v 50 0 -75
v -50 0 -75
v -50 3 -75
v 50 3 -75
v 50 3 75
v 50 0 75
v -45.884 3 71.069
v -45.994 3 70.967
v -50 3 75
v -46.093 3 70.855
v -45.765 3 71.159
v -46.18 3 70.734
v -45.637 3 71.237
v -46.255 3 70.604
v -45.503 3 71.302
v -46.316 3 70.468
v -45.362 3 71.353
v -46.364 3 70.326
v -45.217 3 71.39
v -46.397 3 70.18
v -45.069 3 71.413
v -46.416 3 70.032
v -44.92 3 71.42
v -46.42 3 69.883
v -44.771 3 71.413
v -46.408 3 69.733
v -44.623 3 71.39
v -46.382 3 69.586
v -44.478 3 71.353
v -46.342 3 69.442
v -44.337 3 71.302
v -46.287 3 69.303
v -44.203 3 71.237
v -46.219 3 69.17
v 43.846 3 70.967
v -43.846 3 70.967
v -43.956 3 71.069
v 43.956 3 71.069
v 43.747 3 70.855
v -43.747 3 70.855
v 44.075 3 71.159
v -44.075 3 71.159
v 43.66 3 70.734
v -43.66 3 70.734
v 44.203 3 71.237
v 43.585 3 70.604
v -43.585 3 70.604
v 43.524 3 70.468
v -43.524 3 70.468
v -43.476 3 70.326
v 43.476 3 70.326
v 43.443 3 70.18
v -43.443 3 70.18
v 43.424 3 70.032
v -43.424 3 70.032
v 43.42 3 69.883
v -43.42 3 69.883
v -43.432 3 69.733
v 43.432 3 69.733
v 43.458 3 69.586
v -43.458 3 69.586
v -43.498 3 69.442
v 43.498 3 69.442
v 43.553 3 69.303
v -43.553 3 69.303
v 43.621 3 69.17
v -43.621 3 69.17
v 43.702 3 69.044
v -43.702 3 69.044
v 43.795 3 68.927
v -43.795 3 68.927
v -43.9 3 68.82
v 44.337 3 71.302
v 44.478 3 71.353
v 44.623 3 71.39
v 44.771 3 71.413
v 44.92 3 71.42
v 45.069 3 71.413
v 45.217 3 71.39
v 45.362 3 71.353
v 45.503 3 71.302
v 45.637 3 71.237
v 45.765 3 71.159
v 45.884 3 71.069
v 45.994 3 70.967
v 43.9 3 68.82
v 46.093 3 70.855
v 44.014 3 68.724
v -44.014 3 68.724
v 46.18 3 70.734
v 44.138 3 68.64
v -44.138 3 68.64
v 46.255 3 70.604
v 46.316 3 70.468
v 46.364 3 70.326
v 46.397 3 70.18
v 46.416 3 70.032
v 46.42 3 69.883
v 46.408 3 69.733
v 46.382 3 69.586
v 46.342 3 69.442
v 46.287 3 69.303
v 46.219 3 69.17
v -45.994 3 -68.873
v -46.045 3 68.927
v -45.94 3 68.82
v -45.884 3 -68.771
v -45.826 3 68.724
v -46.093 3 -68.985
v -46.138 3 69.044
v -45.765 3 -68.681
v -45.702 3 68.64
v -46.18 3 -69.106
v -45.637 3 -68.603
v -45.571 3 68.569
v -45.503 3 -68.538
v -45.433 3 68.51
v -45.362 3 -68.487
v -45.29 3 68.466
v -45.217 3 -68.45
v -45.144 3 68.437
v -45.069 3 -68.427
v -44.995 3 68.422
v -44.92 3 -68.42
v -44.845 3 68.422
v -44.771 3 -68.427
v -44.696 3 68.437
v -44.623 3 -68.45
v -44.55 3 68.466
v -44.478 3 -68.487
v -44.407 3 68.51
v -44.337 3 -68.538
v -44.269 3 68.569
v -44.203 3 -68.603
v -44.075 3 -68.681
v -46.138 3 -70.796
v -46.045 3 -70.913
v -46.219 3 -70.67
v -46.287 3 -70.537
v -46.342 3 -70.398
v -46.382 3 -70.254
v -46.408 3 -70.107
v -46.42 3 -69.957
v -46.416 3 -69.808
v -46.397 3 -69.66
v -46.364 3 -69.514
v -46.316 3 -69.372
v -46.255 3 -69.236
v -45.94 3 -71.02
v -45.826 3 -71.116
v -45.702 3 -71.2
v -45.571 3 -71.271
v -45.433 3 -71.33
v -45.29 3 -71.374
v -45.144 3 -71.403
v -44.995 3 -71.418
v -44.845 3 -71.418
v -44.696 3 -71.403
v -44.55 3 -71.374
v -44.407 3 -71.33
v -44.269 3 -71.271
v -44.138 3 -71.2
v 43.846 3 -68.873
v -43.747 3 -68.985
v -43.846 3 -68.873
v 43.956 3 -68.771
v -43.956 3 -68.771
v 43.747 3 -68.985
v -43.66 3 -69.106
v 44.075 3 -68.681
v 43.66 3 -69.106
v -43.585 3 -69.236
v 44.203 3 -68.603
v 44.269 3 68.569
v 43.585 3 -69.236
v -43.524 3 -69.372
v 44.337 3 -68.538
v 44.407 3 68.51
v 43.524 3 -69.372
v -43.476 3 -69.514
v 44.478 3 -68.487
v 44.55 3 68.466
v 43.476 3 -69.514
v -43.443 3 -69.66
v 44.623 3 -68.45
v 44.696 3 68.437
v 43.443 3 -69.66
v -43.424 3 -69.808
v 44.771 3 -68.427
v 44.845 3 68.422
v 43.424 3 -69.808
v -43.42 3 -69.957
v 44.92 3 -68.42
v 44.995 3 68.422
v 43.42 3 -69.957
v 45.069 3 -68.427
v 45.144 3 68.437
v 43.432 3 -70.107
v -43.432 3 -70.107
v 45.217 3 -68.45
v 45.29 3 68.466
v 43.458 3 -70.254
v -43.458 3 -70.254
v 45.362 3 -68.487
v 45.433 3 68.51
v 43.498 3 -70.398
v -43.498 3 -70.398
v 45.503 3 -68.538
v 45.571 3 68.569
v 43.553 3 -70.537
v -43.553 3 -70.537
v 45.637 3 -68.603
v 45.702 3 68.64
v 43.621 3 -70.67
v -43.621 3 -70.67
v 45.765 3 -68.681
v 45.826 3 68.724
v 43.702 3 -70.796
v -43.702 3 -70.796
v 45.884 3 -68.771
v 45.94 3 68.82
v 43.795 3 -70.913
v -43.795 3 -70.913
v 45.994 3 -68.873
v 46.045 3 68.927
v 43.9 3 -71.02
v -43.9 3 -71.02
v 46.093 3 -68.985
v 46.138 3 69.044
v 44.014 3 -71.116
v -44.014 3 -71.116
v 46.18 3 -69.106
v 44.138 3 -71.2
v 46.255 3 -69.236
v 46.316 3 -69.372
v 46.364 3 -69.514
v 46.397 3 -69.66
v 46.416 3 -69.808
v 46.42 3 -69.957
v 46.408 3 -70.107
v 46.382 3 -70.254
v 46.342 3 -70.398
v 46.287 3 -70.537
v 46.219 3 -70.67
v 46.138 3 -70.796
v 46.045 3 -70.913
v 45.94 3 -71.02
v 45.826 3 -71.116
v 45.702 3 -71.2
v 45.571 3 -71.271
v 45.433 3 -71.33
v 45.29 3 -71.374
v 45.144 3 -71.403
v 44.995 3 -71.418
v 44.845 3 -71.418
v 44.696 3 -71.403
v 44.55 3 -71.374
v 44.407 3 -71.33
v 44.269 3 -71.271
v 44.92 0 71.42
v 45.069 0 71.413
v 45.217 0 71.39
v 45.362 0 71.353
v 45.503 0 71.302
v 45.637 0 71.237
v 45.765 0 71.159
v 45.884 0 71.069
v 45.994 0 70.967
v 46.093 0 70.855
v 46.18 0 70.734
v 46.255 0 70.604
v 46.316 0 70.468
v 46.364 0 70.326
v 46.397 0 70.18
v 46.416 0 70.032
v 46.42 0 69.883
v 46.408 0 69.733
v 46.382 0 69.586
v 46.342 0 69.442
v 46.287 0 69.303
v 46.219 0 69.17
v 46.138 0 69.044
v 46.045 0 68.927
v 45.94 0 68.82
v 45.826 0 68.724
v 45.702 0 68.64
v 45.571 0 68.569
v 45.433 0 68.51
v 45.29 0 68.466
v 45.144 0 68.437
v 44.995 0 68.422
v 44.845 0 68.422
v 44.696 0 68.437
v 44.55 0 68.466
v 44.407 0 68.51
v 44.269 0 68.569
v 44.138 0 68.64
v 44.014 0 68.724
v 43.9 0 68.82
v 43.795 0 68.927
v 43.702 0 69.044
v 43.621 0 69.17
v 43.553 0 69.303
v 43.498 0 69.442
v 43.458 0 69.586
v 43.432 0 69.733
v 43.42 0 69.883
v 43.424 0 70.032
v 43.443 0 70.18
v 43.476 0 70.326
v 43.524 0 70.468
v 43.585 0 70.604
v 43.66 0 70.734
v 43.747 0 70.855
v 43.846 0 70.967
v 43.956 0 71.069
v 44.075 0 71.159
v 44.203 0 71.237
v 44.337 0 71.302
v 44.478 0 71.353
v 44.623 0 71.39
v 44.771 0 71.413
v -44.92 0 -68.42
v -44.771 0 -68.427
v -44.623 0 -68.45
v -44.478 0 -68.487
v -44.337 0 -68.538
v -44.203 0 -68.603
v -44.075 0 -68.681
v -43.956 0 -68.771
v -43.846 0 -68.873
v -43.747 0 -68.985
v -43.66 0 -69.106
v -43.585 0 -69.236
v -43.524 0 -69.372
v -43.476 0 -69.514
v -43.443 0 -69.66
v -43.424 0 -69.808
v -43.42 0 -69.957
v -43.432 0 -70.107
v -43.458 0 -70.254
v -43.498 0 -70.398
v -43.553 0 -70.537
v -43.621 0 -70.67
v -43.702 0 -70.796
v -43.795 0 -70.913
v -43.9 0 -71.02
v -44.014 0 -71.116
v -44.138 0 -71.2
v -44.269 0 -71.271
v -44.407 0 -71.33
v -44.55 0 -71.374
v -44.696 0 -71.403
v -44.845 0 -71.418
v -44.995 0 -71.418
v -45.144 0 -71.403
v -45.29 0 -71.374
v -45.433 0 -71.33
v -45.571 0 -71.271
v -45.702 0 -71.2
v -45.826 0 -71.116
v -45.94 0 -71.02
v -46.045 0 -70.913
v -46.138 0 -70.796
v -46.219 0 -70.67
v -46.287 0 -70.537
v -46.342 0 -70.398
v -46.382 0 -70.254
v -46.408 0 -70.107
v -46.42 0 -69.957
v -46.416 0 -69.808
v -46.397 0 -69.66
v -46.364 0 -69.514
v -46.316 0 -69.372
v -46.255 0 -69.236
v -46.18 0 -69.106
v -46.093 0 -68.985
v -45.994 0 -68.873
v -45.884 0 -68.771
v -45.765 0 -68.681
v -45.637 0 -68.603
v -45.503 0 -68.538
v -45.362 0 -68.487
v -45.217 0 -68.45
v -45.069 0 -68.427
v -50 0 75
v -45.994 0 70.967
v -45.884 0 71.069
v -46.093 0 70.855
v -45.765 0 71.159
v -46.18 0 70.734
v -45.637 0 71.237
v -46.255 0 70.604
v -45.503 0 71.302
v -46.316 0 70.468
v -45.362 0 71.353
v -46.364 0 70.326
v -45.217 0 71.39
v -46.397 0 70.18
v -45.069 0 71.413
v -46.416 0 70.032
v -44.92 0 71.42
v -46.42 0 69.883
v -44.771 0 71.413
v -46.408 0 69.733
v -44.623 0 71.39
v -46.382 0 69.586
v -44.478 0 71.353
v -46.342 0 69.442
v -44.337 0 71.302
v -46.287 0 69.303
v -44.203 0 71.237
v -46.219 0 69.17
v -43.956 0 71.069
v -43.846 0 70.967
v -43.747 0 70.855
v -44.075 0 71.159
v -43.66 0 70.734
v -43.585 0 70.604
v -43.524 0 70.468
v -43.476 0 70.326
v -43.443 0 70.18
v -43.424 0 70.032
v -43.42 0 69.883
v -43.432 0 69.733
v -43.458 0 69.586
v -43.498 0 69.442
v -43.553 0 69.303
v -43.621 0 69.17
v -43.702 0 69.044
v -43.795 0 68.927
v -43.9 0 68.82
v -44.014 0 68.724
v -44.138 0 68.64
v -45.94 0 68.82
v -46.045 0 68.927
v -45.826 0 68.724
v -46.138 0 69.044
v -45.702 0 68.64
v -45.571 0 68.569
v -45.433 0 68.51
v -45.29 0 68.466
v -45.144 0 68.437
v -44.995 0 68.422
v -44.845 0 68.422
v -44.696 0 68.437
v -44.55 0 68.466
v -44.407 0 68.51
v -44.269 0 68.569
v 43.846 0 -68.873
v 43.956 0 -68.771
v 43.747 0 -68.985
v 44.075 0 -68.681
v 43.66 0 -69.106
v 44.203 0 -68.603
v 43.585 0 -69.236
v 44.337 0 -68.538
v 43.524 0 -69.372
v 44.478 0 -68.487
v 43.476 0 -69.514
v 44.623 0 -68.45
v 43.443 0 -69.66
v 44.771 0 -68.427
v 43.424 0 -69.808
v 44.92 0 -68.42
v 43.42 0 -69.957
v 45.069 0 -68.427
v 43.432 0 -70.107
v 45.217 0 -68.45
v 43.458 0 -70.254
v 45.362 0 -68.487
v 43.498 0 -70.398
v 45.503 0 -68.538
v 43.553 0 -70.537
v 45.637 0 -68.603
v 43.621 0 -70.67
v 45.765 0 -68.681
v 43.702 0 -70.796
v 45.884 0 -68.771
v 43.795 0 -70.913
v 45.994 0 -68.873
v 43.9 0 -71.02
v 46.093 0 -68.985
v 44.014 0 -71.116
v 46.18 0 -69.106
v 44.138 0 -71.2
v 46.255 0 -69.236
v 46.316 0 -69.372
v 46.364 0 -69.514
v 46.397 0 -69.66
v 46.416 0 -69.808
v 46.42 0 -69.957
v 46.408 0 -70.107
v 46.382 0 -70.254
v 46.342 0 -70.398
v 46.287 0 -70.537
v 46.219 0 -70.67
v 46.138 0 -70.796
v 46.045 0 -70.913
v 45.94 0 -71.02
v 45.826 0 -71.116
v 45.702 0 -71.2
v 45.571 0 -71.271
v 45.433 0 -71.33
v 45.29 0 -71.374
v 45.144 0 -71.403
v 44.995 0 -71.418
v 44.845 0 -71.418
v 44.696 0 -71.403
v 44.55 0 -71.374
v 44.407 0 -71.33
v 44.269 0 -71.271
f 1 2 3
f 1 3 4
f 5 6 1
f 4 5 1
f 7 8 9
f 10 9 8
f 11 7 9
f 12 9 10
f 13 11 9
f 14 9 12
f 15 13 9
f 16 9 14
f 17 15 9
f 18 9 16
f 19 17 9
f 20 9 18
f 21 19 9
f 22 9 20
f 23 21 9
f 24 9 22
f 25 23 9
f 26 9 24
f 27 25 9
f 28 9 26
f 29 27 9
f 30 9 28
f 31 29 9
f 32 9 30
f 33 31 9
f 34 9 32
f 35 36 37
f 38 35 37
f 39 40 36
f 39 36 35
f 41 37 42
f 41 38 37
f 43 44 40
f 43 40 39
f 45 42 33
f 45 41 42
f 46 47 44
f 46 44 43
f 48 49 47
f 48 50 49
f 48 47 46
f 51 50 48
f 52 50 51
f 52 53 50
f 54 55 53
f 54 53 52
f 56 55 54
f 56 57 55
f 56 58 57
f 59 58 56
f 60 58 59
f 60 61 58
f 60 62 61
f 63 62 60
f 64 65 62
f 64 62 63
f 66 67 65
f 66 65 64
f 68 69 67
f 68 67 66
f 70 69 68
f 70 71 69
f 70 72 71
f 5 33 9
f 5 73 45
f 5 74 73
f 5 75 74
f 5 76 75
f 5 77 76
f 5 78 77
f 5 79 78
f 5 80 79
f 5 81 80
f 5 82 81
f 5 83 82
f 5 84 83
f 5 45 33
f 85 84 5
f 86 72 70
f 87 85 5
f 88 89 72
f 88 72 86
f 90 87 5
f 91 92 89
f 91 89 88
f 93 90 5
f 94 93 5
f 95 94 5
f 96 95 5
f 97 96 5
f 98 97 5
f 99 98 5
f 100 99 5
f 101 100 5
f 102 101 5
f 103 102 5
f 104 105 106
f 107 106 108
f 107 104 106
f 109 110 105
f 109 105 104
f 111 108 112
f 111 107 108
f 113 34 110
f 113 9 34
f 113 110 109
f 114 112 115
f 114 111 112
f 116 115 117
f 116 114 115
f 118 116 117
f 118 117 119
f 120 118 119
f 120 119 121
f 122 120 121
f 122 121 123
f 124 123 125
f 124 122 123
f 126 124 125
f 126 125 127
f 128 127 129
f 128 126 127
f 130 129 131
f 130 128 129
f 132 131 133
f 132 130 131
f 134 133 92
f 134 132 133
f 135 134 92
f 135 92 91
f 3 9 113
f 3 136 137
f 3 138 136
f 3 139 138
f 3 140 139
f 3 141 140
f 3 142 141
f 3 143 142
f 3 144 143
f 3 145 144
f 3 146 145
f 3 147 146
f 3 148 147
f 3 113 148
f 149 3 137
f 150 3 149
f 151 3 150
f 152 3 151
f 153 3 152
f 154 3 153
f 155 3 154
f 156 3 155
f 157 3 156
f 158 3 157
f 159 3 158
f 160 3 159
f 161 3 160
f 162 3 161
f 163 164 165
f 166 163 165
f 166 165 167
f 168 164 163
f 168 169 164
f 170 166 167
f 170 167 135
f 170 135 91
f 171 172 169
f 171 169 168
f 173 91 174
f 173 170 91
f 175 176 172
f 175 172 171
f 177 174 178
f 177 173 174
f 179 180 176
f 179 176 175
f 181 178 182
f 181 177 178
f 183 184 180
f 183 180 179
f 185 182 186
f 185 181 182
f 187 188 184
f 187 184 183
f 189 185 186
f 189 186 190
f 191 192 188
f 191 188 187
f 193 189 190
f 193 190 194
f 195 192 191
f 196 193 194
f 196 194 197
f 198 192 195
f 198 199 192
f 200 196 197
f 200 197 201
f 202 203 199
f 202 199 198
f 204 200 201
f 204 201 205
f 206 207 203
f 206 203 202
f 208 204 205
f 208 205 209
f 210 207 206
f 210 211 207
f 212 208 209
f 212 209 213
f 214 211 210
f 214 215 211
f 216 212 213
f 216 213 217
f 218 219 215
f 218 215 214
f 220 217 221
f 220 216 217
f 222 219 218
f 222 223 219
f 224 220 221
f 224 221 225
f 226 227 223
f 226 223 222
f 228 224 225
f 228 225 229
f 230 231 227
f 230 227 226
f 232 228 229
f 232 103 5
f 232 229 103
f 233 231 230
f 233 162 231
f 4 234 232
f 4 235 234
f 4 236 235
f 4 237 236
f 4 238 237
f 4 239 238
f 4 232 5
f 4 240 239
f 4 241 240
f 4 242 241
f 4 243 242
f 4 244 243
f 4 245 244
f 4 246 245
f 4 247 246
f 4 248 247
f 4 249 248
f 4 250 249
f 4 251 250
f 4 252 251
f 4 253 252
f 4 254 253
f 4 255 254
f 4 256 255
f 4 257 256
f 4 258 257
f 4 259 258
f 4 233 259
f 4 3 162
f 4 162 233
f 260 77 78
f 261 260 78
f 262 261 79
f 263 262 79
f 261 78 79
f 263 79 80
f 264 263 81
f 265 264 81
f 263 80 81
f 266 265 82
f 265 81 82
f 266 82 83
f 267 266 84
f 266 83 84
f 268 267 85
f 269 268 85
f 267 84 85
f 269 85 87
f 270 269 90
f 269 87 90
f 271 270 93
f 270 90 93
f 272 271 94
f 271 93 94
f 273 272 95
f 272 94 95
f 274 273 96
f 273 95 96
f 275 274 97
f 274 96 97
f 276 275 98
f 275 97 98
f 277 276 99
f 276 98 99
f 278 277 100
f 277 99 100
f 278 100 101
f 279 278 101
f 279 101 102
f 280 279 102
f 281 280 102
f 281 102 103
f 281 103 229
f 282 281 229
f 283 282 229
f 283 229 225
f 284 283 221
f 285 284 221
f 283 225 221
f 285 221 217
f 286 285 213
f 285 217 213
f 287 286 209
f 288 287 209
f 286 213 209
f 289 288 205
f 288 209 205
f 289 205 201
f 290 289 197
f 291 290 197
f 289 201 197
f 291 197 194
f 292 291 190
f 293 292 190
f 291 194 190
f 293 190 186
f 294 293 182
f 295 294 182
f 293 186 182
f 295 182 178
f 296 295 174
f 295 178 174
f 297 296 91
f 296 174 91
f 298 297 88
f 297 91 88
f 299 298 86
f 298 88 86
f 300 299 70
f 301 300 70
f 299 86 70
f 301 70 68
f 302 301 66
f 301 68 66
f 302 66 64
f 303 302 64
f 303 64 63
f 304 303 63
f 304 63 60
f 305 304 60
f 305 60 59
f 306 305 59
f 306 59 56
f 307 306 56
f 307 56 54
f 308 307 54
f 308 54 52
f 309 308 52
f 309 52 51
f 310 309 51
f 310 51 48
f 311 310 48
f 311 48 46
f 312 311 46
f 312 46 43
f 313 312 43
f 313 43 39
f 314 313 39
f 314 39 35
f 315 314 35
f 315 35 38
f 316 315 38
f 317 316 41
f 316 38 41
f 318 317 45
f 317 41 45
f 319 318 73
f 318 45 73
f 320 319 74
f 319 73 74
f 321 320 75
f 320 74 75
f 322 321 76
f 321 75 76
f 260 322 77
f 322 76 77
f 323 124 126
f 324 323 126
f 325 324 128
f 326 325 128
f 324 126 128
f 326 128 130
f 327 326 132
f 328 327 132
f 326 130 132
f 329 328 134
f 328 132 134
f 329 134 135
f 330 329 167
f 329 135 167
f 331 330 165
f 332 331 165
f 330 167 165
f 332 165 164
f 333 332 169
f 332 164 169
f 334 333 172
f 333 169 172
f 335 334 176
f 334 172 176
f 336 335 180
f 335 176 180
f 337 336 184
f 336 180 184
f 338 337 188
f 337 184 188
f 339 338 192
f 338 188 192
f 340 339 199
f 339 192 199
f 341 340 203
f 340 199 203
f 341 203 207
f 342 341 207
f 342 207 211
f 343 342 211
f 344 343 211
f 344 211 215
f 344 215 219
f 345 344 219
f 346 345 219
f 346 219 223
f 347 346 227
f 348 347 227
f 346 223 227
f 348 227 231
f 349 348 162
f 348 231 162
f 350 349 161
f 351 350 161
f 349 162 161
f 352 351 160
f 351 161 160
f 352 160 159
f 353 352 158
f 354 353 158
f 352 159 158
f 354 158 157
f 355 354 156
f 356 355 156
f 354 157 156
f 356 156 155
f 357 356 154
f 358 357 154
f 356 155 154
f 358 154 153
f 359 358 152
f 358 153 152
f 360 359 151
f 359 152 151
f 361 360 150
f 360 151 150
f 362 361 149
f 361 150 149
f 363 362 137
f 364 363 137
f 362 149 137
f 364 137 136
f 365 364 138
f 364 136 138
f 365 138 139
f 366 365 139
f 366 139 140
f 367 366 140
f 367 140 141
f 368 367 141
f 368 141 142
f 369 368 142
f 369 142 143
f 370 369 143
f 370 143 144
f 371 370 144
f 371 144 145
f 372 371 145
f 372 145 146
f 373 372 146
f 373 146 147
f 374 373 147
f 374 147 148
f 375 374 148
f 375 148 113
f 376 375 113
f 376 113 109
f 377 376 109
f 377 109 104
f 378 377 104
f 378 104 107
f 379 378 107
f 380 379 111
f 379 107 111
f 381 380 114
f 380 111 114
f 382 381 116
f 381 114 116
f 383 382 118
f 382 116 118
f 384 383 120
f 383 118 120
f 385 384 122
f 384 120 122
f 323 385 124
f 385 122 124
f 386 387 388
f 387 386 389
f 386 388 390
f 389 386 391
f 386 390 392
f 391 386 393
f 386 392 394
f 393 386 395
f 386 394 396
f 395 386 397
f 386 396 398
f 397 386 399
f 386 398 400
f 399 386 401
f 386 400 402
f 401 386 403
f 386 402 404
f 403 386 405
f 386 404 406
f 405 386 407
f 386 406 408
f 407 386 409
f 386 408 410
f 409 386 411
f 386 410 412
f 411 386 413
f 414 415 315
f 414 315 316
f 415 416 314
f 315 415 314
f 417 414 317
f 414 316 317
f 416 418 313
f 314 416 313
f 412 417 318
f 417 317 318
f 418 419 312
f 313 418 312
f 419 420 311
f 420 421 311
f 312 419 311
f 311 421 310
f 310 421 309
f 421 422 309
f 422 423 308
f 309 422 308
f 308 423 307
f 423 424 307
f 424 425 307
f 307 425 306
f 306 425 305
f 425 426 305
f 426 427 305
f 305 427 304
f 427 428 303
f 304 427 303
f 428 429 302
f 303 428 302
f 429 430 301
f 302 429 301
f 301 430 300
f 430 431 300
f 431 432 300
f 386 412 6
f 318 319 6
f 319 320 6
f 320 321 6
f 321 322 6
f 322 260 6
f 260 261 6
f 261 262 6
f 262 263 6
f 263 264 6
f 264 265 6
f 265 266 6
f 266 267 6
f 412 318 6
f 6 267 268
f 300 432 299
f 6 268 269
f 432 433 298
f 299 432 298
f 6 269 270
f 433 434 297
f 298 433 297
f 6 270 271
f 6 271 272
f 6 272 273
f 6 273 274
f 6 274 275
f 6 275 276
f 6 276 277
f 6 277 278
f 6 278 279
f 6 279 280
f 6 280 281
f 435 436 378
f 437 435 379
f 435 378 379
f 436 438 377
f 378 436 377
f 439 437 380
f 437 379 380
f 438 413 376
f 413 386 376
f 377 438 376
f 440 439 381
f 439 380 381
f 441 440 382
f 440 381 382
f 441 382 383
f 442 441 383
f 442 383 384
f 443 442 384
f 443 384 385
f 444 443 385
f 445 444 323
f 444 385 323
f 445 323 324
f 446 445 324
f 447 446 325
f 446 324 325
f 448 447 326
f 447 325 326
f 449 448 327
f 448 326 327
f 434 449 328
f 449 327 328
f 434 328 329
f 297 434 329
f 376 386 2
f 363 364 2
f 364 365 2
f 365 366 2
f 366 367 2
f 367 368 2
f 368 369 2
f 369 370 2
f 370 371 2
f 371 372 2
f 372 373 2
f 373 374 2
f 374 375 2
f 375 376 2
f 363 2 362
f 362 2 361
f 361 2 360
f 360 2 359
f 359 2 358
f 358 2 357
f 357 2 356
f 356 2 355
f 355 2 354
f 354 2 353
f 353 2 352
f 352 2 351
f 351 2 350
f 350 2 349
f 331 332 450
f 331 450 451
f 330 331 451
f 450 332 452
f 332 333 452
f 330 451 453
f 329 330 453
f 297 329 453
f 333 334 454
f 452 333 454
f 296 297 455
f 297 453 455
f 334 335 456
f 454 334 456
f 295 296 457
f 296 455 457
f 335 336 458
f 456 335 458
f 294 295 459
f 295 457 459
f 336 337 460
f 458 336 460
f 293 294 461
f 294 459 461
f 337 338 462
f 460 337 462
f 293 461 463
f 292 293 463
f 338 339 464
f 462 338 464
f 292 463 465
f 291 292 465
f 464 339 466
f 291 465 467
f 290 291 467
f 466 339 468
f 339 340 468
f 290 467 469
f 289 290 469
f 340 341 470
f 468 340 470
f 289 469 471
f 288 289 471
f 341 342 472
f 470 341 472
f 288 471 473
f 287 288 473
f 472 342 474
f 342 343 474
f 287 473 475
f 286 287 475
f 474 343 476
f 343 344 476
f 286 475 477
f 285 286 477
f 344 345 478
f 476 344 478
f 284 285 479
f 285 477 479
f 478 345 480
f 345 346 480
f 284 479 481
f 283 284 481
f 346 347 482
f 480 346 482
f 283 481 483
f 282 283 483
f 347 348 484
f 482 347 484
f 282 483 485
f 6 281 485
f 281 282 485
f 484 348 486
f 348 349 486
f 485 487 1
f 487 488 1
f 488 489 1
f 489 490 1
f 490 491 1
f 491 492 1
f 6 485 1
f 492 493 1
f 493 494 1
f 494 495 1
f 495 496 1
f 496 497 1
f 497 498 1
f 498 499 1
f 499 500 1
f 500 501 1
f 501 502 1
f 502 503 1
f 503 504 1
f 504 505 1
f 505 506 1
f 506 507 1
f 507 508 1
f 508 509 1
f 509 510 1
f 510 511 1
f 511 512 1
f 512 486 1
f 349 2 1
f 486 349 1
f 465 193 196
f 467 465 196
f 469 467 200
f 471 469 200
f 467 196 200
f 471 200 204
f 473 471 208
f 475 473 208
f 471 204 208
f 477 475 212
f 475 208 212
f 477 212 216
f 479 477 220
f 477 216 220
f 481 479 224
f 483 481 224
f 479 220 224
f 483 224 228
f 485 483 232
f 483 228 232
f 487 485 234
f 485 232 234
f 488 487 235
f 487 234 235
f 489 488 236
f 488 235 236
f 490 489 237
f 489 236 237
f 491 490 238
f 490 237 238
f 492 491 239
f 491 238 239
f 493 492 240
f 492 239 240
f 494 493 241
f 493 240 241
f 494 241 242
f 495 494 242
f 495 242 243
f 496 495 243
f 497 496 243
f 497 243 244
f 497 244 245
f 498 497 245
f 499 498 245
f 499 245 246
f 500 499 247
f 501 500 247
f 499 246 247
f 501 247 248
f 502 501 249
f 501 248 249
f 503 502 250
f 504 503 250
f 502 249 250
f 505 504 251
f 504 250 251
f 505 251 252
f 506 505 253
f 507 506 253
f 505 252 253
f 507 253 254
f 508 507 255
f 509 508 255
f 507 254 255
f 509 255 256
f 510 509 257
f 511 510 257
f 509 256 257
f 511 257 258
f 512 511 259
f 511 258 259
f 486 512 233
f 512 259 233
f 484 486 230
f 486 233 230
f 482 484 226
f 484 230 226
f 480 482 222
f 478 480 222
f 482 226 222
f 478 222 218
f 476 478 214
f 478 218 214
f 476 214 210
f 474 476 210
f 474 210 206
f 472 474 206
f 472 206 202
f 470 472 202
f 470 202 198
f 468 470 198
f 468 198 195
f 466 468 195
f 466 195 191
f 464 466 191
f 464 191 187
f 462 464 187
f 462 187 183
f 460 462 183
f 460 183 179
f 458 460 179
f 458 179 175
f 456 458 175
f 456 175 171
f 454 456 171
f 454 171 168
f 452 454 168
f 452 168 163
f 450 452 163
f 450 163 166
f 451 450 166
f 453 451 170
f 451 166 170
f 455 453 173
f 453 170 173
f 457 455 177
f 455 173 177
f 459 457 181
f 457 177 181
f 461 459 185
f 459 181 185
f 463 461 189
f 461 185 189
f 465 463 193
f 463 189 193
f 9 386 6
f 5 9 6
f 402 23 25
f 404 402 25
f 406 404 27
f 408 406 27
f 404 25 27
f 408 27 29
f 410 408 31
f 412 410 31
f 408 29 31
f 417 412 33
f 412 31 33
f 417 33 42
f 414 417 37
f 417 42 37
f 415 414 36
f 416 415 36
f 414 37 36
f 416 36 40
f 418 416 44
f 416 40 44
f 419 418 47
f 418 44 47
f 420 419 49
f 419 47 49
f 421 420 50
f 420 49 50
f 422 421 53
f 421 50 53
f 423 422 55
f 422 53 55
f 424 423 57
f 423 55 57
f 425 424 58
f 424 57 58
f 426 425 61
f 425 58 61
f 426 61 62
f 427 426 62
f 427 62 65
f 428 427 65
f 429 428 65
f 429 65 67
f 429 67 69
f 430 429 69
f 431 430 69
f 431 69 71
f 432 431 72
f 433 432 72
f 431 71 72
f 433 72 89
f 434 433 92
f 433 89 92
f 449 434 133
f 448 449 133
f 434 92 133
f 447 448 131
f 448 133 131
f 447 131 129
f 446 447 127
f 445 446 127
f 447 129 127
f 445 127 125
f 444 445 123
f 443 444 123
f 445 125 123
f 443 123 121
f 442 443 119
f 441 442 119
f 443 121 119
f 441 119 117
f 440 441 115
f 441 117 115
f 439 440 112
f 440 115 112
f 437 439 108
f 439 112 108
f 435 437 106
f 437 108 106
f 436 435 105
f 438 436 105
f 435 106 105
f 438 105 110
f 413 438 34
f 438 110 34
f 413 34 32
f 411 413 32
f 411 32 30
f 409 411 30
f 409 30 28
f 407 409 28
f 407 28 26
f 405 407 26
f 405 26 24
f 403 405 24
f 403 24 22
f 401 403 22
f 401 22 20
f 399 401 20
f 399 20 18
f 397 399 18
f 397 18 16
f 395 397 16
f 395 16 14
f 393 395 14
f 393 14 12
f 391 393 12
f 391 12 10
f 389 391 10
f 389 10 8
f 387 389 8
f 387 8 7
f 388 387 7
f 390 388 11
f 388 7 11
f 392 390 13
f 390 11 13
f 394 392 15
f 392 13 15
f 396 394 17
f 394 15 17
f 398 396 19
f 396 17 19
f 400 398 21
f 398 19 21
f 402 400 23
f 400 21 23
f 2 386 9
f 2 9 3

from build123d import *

# Parameters (mm, degrees)
SKETCH1_W           = 99.999999898
SKETCH1_H           = 149.999999974
BOSS_EXTRUDE1_DEPTH = 3
SKETCH2_R           = 1.500000048
SKETCH2_R_2         = 1.5
CUT_EXTRUDE1_DEPTH  = 3


with BuildPart() as part:
    # Sketch1 → Boss-Extrude1 (new body)
    with BuildSketch(Plane(origin=(0, 0, 0), x_dir=(1, 0, 0), z_dir=(0, 1, 0))):
        Rectangle(SKETCH1_W, SKETCH1_H)
    extrude(amount=BOSS_EXTRUDE1_DEPTH)

    # Sketch2 → Cut-Extrude1 (cut)
    with BuildSketch(Plane(origin=(0, 3, 0), x_dir=(1, 0, 0), z_dir=(0, 1, 0))):
        with Locations(Location((-44.919999949, 69.919999987, 0), (0, 0, 270))):
            Circle(SKETCH2_R)
        with Locations(Location((44.919999949, 69.919999987, 0), (0, 0, 270))):
            Circle(SKETCH2_R_2)
        with Locations(Location((-44.919999949, -69.919999987, 0), (0, 0, 270))):
            Circle(SKETCH2_R_2)
        with Locations(Location((44.919999949, -69.919999987, 0), (0, 0, 270))):
            Circle(SKETCH2_R_2)
    extrude(amount=-CUT_EXTRUDE1_DEPTH, mode=Mode.SUBTRACT)


solid = part.part
